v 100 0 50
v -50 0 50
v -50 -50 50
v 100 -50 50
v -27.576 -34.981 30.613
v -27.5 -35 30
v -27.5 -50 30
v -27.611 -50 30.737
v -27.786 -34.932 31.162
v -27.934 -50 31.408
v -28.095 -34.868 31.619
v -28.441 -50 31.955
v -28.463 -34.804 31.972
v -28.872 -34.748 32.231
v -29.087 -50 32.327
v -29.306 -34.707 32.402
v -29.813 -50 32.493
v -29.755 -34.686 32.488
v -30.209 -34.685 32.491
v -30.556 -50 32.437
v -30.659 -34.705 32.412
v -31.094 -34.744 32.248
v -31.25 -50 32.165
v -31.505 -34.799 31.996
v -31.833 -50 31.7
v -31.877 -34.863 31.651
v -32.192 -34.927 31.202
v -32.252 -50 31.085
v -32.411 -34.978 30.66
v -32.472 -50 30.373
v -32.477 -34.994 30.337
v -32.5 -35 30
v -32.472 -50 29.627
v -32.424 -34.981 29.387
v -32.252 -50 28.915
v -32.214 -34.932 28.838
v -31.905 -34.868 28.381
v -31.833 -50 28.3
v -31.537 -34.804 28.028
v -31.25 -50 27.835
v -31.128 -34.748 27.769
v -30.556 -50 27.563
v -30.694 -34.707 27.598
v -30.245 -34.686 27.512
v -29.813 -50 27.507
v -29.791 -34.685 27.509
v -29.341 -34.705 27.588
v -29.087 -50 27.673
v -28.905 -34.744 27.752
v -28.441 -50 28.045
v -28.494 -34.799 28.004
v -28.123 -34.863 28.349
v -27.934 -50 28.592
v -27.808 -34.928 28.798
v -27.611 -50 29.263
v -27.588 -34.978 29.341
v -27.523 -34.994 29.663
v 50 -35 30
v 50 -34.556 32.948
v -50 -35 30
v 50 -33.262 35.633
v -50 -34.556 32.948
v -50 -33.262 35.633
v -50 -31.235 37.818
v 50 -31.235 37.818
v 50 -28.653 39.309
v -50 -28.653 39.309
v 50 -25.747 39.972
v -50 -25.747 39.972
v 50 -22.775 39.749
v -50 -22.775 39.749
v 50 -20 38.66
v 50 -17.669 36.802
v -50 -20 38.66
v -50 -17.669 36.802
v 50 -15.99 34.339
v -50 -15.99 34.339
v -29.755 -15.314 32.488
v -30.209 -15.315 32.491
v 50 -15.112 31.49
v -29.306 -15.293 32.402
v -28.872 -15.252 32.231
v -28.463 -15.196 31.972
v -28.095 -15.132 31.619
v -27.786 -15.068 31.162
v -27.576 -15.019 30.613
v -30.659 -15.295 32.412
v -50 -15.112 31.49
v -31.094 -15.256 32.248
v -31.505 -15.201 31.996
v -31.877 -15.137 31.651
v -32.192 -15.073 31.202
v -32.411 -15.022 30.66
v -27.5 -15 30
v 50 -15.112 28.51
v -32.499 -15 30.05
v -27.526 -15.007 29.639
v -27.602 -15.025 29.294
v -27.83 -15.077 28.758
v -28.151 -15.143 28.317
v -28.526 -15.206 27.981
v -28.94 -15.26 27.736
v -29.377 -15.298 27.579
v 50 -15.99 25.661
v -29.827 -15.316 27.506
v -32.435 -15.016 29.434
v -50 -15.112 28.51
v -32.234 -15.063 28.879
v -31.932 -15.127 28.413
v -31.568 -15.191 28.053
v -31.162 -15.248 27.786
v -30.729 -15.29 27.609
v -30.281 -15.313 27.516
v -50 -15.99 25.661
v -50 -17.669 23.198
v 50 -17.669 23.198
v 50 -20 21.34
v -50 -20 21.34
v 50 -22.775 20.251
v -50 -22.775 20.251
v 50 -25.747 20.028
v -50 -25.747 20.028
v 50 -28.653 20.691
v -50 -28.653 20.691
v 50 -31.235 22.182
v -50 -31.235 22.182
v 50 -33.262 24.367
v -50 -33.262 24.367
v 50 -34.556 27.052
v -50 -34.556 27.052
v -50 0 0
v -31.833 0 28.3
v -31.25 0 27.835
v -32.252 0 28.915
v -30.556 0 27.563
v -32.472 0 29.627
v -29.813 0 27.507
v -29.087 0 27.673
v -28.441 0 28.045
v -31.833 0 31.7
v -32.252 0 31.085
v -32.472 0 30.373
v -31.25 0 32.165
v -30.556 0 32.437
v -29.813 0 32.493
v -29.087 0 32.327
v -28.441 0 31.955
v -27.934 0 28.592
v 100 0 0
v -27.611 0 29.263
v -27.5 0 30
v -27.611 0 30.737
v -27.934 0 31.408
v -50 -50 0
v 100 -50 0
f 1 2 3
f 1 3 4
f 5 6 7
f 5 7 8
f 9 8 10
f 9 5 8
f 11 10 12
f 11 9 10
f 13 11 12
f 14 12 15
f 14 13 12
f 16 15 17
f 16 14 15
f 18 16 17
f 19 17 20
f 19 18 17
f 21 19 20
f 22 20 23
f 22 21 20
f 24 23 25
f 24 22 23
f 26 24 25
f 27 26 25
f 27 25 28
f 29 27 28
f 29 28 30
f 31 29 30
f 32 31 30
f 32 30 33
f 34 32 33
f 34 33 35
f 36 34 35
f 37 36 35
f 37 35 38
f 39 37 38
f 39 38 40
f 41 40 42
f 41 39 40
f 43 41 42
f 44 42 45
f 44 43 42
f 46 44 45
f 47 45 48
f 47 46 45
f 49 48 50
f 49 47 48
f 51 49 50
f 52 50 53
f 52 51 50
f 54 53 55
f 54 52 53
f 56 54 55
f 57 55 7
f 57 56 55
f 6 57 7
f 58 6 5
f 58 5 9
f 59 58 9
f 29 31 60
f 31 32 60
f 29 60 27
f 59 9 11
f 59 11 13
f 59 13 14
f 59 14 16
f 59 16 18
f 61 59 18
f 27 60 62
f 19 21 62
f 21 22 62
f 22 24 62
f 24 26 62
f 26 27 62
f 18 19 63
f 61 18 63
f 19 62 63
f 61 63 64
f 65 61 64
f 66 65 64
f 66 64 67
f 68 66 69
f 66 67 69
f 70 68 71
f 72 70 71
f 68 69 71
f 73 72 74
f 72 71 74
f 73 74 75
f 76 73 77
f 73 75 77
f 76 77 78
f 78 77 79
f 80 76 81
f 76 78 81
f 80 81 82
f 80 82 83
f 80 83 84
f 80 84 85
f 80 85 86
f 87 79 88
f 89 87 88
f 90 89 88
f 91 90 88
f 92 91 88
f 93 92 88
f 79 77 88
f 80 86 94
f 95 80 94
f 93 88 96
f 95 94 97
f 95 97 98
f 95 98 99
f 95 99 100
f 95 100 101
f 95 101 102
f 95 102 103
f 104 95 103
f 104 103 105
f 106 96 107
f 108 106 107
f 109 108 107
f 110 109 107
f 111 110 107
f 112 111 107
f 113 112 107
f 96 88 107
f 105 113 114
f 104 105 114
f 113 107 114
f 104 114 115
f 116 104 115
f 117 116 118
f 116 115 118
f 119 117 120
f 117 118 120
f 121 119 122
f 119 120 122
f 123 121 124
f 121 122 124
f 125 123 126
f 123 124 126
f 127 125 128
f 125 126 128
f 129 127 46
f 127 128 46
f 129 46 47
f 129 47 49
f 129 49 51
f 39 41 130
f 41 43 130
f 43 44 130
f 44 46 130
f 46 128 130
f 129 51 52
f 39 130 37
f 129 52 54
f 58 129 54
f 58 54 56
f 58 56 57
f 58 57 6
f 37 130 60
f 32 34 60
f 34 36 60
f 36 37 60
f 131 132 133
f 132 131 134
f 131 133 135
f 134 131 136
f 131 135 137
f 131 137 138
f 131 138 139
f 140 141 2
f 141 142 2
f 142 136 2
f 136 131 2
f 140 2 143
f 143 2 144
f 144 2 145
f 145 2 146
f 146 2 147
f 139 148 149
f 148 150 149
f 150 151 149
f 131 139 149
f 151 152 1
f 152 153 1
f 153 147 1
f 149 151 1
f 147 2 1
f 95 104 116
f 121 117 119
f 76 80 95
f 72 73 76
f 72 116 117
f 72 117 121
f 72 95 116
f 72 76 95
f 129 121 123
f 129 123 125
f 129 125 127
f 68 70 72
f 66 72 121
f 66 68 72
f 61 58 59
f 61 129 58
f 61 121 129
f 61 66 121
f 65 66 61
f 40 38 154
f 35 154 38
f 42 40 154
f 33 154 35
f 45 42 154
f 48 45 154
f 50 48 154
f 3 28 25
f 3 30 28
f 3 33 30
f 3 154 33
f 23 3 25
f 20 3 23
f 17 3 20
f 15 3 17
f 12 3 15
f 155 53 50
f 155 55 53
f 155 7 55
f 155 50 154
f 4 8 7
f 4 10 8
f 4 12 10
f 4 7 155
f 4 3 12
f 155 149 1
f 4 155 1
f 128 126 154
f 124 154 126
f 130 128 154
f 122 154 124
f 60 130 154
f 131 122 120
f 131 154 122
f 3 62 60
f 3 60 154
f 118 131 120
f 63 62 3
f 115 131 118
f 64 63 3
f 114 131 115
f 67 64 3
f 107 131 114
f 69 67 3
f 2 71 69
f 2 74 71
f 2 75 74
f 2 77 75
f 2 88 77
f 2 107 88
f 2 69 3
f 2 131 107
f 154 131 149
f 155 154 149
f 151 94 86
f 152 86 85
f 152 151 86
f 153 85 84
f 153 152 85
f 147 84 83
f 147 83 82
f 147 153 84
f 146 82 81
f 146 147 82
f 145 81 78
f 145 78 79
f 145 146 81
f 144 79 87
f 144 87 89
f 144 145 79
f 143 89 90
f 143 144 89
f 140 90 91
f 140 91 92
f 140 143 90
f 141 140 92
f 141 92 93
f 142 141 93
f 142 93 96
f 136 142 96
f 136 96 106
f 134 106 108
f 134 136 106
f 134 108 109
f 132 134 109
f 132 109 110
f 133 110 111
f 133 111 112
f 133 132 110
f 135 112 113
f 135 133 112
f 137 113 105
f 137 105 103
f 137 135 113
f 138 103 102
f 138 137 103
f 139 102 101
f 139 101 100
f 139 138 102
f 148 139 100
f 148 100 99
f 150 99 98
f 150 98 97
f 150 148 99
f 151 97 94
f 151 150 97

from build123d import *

# Parameters (mm, degrees)
F0_W     = 150
F0_H     = 50
F1_DEPTH = 50
F2_R     = 2.5
F3_DEPTH = 50
F4_R     = 10
F5_DEPTH = 100


with BuildPart() as f1:
    # F0 (on Front) → F1 (new body)
    with BuildSketch(Plane.XZ):
        with Locations((25, 25)):
            Rectangle(F0_W, F0_H)
    extrude(amount=F1_DEPTH)

    # F2 (on Front) → F3 (cut)
    with BuildSketch(Plane.XZ):
        with Locations((-30, 30)):
            Circle(F2_R)
    extrude(amount=F3_DEPTH, mode=Mode.SUBTRACT)

    # F4 (on face) → F5 (cut)
    with BuildSketch(Plane(origin=(-50, 0, 0), x_dir=(0, -1, 0), z_dir=(-1, 0, 0))):
        with Locations((25, 30)):
            Circle(F4_R)
    extrude(amount=-F5_DEPTH, mode=Mode.SUBTRACT)


solid = f1.part
